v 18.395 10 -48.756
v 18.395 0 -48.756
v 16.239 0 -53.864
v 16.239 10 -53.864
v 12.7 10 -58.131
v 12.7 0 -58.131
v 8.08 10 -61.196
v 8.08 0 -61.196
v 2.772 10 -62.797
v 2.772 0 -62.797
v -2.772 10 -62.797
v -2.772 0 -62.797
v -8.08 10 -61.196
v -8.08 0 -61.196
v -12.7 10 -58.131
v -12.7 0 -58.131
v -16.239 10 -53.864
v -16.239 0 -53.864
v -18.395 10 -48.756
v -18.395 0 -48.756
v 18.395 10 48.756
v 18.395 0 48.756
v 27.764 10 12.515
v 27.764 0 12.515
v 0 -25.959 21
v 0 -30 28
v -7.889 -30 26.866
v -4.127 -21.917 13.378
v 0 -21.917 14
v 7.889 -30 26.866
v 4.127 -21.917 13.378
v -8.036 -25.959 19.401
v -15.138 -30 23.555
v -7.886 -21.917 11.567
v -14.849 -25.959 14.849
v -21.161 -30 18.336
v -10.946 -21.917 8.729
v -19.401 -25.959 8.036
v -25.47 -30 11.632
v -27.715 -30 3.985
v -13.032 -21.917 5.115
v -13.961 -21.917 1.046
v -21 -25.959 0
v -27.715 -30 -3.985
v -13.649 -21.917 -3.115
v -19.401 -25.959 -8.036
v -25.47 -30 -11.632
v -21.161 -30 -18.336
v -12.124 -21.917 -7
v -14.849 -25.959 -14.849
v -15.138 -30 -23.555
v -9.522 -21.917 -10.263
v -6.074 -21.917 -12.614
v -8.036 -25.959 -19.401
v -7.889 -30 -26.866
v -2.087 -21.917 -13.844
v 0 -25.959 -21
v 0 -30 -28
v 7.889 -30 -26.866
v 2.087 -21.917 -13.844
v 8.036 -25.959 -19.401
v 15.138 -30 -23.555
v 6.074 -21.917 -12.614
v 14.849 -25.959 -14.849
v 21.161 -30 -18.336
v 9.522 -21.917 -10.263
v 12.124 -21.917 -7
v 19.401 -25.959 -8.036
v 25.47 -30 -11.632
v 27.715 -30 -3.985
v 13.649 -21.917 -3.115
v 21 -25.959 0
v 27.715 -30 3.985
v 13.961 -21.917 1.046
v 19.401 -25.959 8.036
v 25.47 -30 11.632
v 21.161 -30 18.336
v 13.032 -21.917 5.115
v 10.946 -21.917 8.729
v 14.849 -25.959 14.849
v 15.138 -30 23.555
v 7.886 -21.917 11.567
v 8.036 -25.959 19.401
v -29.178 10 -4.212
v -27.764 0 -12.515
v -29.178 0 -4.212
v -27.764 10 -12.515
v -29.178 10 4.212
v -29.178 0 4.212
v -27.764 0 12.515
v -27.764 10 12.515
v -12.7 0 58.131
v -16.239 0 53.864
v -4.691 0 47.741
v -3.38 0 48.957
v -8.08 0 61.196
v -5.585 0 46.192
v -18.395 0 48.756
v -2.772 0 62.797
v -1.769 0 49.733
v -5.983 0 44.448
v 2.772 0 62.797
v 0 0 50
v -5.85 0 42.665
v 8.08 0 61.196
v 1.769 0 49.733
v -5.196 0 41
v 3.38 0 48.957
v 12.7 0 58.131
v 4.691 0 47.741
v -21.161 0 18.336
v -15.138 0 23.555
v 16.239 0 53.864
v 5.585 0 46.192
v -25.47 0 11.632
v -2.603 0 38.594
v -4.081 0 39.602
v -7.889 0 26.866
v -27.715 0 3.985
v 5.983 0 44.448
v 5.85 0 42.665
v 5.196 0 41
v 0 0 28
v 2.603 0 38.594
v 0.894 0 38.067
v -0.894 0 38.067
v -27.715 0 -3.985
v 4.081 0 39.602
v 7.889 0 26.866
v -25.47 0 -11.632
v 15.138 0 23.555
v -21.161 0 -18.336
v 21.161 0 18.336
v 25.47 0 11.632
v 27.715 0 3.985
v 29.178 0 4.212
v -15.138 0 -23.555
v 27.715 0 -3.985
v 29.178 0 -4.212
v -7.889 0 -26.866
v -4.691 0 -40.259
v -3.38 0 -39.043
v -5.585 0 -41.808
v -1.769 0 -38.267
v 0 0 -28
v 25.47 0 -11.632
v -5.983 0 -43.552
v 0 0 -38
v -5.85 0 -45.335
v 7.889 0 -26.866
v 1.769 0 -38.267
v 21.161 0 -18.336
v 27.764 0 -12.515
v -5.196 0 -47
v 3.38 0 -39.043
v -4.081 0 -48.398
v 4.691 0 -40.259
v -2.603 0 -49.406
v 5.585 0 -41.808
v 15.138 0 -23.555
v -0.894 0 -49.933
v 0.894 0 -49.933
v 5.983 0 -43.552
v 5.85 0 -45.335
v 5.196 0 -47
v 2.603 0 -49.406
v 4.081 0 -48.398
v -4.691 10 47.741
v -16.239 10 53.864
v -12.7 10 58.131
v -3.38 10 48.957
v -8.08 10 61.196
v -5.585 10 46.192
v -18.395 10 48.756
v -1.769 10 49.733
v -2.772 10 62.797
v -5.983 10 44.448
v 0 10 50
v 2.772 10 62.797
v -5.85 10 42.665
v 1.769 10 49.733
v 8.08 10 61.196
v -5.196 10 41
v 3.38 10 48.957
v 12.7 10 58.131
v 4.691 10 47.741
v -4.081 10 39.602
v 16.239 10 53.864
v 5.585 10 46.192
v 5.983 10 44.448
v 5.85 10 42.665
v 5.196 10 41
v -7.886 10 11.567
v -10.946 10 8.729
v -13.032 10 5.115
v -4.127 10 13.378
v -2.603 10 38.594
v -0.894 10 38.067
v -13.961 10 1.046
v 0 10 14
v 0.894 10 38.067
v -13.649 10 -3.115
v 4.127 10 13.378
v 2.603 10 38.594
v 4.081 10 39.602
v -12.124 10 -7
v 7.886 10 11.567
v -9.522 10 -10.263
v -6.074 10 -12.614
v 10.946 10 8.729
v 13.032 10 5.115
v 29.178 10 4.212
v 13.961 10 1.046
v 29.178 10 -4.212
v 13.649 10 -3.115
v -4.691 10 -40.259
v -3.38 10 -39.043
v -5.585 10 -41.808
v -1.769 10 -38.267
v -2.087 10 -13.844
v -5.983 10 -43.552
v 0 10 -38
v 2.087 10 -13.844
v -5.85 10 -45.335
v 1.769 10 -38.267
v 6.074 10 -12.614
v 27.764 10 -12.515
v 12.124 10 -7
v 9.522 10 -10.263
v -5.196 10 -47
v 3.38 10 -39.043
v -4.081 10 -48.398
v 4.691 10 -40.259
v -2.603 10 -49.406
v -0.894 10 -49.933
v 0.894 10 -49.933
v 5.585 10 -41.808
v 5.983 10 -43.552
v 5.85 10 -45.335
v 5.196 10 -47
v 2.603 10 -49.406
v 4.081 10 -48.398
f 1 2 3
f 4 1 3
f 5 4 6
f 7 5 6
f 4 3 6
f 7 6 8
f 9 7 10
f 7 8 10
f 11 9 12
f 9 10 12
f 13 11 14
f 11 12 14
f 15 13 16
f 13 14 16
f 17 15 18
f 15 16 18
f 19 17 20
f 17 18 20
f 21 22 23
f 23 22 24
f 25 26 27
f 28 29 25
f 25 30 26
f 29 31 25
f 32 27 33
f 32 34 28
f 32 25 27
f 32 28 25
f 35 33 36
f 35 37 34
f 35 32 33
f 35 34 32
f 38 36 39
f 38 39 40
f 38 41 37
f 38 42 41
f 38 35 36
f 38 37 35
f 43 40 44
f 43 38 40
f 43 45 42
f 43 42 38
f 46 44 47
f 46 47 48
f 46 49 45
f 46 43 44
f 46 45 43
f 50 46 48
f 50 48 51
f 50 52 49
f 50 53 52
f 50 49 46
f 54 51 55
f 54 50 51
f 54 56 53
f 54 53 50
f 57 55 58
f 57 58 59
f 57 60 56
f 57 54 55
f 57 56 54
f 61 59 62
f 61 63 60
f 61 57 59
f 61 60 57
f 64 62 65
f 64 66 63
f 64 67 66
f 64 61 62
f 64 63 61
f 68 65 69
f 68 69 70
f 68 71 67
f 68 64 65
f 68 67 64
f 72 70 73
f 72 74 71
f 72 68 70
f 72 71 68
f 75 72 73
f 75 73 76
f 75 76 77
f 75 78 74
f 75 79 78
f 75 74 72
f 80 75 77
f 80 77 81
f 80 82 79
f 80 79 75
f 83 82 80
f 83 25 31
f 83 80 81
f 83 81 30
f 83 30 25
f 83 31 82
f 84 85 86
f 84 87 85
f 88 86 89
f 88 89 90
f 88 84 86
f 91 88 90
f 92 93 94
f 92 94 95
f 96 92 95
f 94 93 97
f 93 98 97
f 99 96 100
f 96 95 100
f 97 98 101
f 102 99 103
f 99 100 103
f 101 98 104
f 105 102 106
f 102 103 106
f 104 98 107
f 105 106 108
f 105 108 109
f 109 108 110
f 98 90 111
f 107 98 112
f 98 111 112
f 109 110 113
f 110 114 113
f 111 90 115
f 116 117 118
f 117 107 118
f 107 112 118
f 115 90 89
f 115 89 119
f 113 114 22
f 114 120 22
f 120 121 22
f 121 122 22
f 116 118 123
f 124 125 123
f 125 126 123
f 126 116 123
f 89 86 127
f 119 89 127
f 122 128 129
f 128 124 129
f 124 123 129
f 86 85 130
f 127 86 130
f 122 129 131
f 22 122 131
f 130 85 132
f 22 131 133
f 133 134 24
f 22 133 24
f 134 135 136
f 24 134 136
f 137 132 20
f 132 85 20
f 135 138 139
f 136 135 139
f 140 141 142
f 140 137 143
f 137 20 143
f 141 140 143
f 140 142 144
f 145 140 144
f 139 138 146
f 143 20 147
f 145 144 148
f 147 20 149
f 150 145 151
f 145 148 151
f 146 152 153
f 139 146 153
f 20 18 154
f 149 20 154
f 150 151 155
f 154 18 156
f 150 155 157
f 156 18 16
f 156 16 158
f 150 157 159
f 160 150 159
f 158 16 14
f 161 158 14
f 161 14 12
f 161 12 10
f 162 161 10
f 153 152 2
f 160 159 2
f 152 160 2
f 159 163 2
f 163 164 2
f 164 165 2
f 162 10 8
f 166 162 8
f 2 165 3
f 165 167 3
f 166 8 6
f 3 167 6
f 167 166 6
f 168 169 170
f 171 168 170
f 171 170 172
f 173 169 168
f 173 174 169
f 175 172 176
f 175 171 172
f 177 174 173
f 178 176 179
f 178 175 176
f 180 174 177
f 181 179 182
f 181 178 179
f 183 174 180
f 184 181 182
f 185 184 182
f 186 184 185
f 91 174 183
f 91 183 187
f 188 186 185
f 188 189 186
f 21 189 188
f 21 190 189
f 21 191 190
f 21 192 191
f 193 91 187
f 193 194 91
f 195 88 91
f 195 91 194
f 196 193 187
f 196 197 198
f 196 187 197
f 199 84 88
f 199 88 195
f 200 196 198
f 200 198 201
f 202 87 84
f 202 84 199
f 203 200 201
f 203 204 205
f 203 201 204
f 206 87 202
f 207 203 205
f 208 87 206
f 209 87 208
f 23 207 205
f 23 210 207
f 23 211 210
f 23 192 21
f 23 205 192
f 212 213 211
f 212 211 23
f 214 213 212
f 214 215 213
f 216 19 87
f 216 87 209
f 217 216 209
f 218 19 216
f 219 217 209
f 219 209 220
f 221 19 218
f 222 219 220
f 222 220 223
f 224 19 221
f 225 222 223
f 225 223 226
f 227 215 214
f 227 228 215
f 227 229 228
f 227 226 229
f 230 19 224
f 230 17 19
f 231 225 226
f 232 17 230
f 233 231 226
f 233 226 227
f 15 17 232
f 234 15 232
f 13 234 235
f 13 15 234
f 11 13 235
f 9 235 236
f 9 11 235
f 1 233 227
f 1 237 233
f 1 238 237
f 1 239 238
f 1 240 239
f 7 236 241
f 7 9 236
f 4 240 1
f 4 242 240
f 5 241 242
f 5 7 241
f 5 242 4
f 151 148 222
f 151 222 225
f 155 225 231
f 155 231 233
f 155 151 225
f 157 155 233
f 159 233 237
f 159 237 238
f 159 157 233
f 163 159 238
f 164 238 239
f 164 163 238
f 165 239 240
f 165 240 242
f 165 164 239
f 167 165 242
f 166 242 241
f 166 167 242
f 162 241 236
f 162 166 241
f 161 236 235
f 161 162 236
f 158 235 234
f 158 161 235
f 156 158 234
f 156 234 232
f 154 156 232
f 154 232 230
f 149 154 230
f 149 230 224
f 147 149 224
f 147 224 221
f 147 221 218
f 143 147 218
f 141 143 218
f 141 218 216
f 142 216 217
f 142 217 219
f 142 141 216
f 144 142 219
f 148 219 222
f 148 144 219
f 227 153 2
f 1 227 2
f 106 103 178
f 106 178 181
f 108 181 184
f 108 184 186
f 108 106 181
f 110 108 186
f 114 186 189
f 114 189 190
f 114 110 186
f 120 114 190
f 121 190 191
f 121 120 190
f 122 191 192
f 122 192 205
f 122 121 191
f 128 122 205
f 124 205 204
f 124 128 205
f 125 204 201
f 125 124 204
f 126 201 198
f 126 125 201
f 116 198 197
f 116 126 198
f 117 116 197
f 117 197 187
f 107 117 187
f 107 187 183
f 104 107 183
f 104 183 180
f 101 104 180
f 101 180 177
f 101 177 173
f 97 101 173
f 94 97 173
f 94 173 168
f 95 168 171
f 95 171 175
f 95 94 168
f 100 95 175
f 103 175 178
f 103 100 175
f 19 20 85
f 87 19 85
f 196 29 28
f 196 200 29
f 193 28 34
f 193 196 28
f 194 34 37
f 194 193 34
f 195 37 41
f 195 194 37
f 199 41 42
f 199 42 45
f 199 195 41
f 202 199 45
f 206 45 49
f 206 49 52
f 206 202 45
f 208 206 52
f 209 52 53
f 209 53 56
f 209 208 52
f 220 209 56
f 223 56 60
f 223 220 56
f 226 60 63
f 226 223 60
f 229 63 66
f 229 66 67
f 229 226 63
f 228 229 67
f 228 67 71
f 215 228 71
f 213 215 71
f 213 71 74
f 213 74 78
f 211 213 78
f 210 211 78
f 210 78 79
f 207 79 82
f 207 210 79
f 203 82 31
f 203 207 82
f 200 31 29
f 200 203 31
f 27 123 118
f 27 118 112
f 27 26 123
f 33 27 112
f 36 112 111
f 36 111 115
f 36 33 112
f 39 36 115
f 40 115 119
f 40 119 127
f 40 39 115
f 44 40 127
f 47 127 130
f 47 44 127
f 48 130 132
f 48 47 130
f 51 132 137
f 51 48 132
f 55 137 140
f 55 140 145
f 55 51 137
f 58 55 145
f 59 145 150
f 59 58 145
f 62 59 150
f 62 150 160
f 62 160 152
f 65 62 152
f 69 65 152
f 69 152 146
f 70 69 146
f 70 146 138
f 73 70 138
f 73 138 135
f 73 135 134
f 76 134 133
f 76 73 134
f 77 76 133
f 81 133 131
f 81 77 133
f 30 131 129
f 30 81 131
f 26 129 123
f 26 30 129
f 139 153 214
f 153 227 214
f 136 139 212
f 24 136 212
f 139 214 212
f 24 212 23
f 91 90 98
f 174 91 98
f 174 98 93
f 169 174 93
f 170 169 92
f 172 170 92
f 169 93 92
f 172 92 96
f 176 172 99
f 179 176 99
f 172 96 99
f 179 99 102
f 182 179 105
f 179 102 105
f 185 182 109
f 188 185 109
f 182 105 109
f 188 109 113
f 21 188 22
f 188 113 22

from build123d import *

# Parameters (mm, degrees)
SKETCH1_R           = 14
SKETCH1_R_2         = 19
SKETCH1_R_3         = 6
BOSS_EXTRUDE1_DEPTH = 10
FILLET1_R           = 50


with BuildPart() as part:
    # Sketch1 → Boss-Extrude1 (new body)
    # profile 1 of 3: a face of its own
    with BuildSketch(Plane(origin=(0, 0, 0), x_dir=(1, 0, 0), z_dir=(0, 1, 0))):
        with BuildLine():
            Line((-18.395196505, 48.755706629), (-31, 0))
            Line((-31, 0), (-18.395196505, -48.755706629))
            ThreePointArc((-18.395196505, -48.755706629), (-2.397005048, -25.151807333), (19, -44))
            ThreePointArc((19, -44), (18.848192667, -46.397005048), (18.395196505, -48.755706629))
            Line((18.395196505, -48.755706629), (31, 0))
            Line((31, 0), (18.395196505, 48.755706629))
            ThreePointArc((18.395196505, 48.755706629), (18.848192667, 46.397005048), (19, 44))
            ThreePointArc((19, 44), (-2.397005048, 25.151807333), (-18.395196505, 48.755706629))
        make_face()
        with Locations(Location((0, 0, 0), (0, 0, 270))):
            Circle(SKETCH1_R, mode=Mode.SUBTRACT)
    # profile 2 of 3: a face of its own
    with BuildSketch(Plane(origin=(0, 0, 0), x_dir=(1, 0, 0), z_dir=(0, 1, 0))):
        with Locations((0, -44)):
            Circle(SKETCH1_R_2)
        with Locations(Location((0, -44, 0), (0, 0, 270))):
            Circle(SKETCH1_R_3, mode=Mode.SUBTRACT)
    # profile 3 of 3: a face of its own
    with BuildSketch(Plane(origin=(0, 0, 0), x_dir=(1, 0, 0), z_dir=(0, 1, 0))):
        with Locations((0, 44)):
            Circle(SKETCH1_R_2)
        with Locations(Location((0, 44, 0), (0, 0, 270))):
            Circle(SKETCH1_R_3, mode=Mode.SUBTRACT)
    extrude(amount=BOSS_EXTRUDE1_DEPTH)

    # Fillet1
    fillet1_edges = [part.edges().sort_by_distance(p)[0] for p in [
        (-31, 5, 0),
        (31, 5, 0),
    ]]
    fillet(fillet1_edges, radius=FILLET1_R)

    # Sketch2 → Revolve1 (revolve)
    with BuildSketch(Plane.XY, mode=Mode.PRIVATE) as revolve1_sk:
        Polygon((14, 0), (28, 0), (28, -30), (14, -21.917096231), align=None)
    revolve(revolve1_sk.sketch.rotate(Axis((0, 0, 0), (0, -1, 0)), 90), axis=Axis((0, 0, 0), (0, -1, 0)))


solid = part.part
